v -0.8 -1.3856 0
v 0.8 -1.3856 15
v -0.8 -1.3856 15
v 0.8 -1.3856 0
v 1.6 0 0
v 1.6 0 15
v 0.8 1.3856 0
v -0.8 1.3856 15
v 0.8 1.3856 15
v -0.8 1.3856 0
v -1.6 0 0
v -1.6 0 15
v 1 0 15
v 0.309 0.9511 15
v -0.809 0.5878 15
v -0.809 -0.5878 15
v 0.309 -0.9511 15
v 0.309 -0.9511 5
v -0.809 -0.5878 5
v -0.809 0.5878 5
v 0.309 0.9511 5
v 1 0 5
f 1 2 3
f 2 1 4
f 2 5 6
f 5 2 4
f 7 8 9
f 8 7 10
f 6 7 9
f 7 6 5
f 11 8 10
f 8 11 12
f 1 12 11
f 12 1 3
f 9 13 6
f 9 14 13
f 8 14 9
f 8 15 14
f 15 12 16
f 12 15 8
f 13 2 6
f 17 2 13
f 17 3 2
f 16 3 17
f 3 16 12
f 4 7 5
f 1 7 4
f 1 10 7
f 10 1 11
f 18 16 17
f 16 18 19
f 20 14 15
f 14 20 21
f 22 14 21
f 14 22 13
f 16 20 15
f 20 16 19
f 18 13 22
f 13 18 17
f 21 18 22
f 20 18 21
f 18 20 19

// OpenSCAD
// Parameters
length = 15; //[8:30:1]
original_id = 2.0; //[1.0:4.0:0.1]
original_od = 3.2; //[1.6:6.4:0.1]
forced_id = 0; //[0:6:0.1]
center = 1; //[0:1:1]
eps_overlap = 0.8; //[0.5:2:0.1]
id = 2.0; //[1.0:6.0:0.1]
od = 3.2; //[1.6:10.0:0.1]
z_center_offset = 0; //[-50:50:0.5]

// Tubing - complete geometry
module tubing() {
  color([0.85, 0.85, 0.8]) { // Off-white for heatshrink
    difference() {
      translate([0, 0, z_center_offset])
        cylinder(h=length, r=od/2, center=center);
      translate([0, 0, z_center_offset])
        cylinder(h=length + 2*eps_overlap, r=id/2, center=center);
    }
  }
}

// Sleeved Resistor - complete geometry
module sleeved_resistor() {
  color([0.2, 0.2, 0.2]) { // Dark color for resistor
    translate([0, 0, z_center_offset])
      cylinder(h=5, r=original_id/2, center=center); // Bare resistor
  }
}

// Assembly
module assembly() {
  tubing();
  translate([0, 0, 0]) sleeved_resistor(); // Align resistor with tubing
}

assembly();
